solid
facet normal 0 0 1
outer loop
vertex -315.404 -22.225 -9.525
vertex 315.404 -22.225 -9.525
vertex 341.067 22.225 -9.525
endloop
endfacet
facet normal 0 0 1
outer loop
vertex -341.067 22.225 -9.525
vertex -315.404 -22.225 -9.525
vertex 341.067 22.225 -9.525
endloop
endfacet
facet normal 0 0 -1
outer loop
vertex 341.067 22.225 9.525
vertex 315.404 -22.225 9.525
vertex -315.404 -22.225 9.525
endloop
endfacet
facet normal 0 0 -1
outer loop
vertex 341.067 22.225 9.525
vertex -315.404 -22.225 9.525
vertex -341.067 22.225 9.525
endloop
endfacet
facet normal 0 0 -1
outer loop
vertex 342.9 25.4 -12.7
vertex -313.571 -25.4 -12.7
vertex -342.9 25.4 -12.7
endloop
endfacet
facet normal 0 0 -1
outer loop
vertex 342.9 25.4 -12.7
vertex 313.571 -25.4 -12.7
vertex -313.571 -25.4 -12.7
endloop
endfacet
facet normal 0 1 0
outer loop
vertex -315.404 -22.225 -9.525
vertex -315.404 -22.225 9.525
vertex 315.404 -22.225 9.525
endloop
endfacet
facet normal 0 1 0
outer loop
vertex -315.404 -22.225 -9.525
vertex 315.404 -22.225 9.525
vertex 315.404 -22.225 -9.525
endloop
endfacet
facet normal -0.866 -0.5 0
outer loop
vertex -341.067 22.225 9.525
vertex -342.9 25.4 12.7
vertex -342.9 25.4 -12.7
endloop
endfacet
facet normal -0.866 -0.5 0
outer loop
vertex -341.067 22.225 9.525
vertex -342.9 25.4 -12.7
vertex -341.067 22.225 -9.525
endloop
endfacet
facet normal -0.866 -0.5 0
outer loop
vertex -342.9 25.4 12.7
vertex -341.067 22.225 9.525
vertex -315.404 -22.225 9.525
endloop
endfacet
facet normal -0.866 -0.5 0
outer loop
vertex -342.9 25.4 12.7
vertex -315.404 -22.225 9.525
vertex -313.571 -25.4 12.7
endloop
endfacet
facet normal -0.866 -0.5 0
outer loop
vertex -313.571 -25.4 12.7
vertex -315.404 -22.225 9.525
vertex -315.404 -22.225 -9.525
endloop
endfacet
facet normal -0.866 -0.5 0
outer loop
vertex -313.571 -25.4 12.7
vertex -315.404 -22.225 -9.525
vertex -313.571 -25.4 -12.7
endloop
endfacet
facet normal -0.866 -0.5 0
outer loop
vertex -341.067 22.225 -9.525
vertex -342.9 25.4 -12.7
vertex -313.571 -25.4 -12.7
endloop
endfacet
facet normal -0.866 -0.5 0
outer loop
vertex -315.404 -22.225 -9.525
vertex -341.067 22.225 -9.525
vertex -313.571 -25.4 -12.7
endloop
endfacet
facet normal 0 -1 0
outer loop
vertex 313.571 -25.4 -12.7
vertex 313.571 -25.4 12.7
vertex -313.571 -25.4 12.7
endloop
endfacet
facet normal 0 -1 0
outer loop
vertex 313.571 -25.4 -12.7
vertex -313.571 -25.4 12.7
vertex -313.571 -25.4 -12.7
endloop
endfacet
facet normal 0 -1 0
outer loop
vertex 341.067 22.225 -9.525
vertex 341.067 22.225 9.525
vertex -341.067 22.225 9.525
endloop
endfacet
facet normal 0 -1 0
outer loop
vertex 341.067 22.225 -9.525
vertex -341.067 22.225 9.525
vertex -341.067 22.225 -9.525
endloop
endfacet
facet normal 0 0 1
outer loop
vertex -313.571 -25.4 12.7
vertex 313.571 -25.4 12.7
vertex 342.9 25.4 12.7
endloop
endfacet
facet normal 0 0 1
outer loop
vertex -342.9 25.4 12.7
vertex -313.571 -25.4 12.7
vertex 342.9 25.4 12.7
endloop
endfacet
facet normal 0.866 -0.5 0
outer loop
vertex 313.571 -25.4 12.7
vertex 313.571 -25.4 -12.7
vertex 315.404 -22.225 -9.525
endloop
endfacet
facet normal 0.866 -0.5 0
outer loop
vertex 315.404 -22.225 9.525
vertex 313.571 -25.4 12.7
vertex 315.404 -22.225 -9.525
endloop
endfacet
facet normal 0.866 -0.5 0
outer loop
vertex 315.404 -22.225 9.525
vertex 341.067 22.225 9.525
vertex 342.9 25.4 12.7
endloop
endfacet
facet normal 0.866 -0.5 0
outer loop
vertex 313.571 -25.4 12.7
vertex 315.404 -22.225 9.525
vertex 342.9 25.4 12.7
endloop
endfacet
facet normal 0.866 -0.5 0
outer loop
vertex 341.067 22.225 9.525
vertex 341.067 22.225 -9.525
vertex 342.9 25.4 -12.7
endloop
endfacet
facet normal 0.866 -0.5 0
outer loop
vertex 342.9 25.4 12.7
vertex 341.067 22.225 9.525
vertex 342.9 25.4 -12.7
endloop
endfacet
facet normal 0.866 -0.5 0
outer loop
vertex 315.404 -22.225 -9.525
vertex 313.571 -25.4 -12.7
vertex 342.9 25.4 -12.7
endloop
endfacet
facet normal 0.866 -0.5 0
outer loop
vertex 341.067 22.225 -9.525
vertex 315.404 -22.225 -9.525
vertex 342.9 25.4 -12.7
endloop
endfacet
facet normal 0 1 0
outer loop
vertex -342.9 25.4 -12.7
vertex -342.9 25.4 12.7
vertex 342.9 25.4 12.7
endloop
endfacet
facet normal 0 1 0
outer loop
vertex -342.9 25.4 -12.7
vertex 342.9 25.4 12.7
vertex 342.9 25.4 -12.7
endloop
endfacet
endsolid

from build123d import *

# Parameters (mm, degrees)
SKETCH1_W               = 25.4
SKETCH1_H               = 50.8
SKETCH1_W_2             = 19.05
SKETCH1_H_2             = 44.45
BOSS_EXTRUDE1_DEPTH     = 342.9
CUT_EXTRUDE1_DEPTH      = 1
CUT_EXTRUDE1_DEPTH_BACK = 26.4


with BuildPart() as part:
    # Sketch1 → Boss-Extrude1 (new body, symmetric)
    with BuildSketch(Plane(origin=(0, 0, 0), x_dir=(0, 0, -1), z_dir=(1, 0, 0))):
        Rectangle(SKETCH1_W, SKETCH1_H)
        Rectangle(SKETCH1_W_2, SKETCH1_H_2, mode=Mode.SUBTRACT)
    extrude(amount=BOSS_EXTRUDE1_DEPTH, both=True)

    # Sketch2 → Cut-Extrude1 (cut, two sides)
    with BuildSketch(Plane(origin=(0, 0, -12.7), x_dir=(-1, 0, 0), z_dir=(0, 0, -1))) as cut_extrude1_sk:
        Polygon((342.9, -25.4), (342.9, 25.4), (313.570606325, -25.4), align=None)
        Polygon((-342.9, -25.4), (-313.570606325, -25.4), (-342.9, 25.4), align=None)
    extrude(amount=CUT_EXTRUDE1_DEPTH, mode=Mode.SUBTRACT)
    extrude(cut_extrude1_sk.sketch, amount=-CUT_EXTRUDE1_DEPTH_BACK, mode=Mode.SUBTRACT)


solid = part.part
